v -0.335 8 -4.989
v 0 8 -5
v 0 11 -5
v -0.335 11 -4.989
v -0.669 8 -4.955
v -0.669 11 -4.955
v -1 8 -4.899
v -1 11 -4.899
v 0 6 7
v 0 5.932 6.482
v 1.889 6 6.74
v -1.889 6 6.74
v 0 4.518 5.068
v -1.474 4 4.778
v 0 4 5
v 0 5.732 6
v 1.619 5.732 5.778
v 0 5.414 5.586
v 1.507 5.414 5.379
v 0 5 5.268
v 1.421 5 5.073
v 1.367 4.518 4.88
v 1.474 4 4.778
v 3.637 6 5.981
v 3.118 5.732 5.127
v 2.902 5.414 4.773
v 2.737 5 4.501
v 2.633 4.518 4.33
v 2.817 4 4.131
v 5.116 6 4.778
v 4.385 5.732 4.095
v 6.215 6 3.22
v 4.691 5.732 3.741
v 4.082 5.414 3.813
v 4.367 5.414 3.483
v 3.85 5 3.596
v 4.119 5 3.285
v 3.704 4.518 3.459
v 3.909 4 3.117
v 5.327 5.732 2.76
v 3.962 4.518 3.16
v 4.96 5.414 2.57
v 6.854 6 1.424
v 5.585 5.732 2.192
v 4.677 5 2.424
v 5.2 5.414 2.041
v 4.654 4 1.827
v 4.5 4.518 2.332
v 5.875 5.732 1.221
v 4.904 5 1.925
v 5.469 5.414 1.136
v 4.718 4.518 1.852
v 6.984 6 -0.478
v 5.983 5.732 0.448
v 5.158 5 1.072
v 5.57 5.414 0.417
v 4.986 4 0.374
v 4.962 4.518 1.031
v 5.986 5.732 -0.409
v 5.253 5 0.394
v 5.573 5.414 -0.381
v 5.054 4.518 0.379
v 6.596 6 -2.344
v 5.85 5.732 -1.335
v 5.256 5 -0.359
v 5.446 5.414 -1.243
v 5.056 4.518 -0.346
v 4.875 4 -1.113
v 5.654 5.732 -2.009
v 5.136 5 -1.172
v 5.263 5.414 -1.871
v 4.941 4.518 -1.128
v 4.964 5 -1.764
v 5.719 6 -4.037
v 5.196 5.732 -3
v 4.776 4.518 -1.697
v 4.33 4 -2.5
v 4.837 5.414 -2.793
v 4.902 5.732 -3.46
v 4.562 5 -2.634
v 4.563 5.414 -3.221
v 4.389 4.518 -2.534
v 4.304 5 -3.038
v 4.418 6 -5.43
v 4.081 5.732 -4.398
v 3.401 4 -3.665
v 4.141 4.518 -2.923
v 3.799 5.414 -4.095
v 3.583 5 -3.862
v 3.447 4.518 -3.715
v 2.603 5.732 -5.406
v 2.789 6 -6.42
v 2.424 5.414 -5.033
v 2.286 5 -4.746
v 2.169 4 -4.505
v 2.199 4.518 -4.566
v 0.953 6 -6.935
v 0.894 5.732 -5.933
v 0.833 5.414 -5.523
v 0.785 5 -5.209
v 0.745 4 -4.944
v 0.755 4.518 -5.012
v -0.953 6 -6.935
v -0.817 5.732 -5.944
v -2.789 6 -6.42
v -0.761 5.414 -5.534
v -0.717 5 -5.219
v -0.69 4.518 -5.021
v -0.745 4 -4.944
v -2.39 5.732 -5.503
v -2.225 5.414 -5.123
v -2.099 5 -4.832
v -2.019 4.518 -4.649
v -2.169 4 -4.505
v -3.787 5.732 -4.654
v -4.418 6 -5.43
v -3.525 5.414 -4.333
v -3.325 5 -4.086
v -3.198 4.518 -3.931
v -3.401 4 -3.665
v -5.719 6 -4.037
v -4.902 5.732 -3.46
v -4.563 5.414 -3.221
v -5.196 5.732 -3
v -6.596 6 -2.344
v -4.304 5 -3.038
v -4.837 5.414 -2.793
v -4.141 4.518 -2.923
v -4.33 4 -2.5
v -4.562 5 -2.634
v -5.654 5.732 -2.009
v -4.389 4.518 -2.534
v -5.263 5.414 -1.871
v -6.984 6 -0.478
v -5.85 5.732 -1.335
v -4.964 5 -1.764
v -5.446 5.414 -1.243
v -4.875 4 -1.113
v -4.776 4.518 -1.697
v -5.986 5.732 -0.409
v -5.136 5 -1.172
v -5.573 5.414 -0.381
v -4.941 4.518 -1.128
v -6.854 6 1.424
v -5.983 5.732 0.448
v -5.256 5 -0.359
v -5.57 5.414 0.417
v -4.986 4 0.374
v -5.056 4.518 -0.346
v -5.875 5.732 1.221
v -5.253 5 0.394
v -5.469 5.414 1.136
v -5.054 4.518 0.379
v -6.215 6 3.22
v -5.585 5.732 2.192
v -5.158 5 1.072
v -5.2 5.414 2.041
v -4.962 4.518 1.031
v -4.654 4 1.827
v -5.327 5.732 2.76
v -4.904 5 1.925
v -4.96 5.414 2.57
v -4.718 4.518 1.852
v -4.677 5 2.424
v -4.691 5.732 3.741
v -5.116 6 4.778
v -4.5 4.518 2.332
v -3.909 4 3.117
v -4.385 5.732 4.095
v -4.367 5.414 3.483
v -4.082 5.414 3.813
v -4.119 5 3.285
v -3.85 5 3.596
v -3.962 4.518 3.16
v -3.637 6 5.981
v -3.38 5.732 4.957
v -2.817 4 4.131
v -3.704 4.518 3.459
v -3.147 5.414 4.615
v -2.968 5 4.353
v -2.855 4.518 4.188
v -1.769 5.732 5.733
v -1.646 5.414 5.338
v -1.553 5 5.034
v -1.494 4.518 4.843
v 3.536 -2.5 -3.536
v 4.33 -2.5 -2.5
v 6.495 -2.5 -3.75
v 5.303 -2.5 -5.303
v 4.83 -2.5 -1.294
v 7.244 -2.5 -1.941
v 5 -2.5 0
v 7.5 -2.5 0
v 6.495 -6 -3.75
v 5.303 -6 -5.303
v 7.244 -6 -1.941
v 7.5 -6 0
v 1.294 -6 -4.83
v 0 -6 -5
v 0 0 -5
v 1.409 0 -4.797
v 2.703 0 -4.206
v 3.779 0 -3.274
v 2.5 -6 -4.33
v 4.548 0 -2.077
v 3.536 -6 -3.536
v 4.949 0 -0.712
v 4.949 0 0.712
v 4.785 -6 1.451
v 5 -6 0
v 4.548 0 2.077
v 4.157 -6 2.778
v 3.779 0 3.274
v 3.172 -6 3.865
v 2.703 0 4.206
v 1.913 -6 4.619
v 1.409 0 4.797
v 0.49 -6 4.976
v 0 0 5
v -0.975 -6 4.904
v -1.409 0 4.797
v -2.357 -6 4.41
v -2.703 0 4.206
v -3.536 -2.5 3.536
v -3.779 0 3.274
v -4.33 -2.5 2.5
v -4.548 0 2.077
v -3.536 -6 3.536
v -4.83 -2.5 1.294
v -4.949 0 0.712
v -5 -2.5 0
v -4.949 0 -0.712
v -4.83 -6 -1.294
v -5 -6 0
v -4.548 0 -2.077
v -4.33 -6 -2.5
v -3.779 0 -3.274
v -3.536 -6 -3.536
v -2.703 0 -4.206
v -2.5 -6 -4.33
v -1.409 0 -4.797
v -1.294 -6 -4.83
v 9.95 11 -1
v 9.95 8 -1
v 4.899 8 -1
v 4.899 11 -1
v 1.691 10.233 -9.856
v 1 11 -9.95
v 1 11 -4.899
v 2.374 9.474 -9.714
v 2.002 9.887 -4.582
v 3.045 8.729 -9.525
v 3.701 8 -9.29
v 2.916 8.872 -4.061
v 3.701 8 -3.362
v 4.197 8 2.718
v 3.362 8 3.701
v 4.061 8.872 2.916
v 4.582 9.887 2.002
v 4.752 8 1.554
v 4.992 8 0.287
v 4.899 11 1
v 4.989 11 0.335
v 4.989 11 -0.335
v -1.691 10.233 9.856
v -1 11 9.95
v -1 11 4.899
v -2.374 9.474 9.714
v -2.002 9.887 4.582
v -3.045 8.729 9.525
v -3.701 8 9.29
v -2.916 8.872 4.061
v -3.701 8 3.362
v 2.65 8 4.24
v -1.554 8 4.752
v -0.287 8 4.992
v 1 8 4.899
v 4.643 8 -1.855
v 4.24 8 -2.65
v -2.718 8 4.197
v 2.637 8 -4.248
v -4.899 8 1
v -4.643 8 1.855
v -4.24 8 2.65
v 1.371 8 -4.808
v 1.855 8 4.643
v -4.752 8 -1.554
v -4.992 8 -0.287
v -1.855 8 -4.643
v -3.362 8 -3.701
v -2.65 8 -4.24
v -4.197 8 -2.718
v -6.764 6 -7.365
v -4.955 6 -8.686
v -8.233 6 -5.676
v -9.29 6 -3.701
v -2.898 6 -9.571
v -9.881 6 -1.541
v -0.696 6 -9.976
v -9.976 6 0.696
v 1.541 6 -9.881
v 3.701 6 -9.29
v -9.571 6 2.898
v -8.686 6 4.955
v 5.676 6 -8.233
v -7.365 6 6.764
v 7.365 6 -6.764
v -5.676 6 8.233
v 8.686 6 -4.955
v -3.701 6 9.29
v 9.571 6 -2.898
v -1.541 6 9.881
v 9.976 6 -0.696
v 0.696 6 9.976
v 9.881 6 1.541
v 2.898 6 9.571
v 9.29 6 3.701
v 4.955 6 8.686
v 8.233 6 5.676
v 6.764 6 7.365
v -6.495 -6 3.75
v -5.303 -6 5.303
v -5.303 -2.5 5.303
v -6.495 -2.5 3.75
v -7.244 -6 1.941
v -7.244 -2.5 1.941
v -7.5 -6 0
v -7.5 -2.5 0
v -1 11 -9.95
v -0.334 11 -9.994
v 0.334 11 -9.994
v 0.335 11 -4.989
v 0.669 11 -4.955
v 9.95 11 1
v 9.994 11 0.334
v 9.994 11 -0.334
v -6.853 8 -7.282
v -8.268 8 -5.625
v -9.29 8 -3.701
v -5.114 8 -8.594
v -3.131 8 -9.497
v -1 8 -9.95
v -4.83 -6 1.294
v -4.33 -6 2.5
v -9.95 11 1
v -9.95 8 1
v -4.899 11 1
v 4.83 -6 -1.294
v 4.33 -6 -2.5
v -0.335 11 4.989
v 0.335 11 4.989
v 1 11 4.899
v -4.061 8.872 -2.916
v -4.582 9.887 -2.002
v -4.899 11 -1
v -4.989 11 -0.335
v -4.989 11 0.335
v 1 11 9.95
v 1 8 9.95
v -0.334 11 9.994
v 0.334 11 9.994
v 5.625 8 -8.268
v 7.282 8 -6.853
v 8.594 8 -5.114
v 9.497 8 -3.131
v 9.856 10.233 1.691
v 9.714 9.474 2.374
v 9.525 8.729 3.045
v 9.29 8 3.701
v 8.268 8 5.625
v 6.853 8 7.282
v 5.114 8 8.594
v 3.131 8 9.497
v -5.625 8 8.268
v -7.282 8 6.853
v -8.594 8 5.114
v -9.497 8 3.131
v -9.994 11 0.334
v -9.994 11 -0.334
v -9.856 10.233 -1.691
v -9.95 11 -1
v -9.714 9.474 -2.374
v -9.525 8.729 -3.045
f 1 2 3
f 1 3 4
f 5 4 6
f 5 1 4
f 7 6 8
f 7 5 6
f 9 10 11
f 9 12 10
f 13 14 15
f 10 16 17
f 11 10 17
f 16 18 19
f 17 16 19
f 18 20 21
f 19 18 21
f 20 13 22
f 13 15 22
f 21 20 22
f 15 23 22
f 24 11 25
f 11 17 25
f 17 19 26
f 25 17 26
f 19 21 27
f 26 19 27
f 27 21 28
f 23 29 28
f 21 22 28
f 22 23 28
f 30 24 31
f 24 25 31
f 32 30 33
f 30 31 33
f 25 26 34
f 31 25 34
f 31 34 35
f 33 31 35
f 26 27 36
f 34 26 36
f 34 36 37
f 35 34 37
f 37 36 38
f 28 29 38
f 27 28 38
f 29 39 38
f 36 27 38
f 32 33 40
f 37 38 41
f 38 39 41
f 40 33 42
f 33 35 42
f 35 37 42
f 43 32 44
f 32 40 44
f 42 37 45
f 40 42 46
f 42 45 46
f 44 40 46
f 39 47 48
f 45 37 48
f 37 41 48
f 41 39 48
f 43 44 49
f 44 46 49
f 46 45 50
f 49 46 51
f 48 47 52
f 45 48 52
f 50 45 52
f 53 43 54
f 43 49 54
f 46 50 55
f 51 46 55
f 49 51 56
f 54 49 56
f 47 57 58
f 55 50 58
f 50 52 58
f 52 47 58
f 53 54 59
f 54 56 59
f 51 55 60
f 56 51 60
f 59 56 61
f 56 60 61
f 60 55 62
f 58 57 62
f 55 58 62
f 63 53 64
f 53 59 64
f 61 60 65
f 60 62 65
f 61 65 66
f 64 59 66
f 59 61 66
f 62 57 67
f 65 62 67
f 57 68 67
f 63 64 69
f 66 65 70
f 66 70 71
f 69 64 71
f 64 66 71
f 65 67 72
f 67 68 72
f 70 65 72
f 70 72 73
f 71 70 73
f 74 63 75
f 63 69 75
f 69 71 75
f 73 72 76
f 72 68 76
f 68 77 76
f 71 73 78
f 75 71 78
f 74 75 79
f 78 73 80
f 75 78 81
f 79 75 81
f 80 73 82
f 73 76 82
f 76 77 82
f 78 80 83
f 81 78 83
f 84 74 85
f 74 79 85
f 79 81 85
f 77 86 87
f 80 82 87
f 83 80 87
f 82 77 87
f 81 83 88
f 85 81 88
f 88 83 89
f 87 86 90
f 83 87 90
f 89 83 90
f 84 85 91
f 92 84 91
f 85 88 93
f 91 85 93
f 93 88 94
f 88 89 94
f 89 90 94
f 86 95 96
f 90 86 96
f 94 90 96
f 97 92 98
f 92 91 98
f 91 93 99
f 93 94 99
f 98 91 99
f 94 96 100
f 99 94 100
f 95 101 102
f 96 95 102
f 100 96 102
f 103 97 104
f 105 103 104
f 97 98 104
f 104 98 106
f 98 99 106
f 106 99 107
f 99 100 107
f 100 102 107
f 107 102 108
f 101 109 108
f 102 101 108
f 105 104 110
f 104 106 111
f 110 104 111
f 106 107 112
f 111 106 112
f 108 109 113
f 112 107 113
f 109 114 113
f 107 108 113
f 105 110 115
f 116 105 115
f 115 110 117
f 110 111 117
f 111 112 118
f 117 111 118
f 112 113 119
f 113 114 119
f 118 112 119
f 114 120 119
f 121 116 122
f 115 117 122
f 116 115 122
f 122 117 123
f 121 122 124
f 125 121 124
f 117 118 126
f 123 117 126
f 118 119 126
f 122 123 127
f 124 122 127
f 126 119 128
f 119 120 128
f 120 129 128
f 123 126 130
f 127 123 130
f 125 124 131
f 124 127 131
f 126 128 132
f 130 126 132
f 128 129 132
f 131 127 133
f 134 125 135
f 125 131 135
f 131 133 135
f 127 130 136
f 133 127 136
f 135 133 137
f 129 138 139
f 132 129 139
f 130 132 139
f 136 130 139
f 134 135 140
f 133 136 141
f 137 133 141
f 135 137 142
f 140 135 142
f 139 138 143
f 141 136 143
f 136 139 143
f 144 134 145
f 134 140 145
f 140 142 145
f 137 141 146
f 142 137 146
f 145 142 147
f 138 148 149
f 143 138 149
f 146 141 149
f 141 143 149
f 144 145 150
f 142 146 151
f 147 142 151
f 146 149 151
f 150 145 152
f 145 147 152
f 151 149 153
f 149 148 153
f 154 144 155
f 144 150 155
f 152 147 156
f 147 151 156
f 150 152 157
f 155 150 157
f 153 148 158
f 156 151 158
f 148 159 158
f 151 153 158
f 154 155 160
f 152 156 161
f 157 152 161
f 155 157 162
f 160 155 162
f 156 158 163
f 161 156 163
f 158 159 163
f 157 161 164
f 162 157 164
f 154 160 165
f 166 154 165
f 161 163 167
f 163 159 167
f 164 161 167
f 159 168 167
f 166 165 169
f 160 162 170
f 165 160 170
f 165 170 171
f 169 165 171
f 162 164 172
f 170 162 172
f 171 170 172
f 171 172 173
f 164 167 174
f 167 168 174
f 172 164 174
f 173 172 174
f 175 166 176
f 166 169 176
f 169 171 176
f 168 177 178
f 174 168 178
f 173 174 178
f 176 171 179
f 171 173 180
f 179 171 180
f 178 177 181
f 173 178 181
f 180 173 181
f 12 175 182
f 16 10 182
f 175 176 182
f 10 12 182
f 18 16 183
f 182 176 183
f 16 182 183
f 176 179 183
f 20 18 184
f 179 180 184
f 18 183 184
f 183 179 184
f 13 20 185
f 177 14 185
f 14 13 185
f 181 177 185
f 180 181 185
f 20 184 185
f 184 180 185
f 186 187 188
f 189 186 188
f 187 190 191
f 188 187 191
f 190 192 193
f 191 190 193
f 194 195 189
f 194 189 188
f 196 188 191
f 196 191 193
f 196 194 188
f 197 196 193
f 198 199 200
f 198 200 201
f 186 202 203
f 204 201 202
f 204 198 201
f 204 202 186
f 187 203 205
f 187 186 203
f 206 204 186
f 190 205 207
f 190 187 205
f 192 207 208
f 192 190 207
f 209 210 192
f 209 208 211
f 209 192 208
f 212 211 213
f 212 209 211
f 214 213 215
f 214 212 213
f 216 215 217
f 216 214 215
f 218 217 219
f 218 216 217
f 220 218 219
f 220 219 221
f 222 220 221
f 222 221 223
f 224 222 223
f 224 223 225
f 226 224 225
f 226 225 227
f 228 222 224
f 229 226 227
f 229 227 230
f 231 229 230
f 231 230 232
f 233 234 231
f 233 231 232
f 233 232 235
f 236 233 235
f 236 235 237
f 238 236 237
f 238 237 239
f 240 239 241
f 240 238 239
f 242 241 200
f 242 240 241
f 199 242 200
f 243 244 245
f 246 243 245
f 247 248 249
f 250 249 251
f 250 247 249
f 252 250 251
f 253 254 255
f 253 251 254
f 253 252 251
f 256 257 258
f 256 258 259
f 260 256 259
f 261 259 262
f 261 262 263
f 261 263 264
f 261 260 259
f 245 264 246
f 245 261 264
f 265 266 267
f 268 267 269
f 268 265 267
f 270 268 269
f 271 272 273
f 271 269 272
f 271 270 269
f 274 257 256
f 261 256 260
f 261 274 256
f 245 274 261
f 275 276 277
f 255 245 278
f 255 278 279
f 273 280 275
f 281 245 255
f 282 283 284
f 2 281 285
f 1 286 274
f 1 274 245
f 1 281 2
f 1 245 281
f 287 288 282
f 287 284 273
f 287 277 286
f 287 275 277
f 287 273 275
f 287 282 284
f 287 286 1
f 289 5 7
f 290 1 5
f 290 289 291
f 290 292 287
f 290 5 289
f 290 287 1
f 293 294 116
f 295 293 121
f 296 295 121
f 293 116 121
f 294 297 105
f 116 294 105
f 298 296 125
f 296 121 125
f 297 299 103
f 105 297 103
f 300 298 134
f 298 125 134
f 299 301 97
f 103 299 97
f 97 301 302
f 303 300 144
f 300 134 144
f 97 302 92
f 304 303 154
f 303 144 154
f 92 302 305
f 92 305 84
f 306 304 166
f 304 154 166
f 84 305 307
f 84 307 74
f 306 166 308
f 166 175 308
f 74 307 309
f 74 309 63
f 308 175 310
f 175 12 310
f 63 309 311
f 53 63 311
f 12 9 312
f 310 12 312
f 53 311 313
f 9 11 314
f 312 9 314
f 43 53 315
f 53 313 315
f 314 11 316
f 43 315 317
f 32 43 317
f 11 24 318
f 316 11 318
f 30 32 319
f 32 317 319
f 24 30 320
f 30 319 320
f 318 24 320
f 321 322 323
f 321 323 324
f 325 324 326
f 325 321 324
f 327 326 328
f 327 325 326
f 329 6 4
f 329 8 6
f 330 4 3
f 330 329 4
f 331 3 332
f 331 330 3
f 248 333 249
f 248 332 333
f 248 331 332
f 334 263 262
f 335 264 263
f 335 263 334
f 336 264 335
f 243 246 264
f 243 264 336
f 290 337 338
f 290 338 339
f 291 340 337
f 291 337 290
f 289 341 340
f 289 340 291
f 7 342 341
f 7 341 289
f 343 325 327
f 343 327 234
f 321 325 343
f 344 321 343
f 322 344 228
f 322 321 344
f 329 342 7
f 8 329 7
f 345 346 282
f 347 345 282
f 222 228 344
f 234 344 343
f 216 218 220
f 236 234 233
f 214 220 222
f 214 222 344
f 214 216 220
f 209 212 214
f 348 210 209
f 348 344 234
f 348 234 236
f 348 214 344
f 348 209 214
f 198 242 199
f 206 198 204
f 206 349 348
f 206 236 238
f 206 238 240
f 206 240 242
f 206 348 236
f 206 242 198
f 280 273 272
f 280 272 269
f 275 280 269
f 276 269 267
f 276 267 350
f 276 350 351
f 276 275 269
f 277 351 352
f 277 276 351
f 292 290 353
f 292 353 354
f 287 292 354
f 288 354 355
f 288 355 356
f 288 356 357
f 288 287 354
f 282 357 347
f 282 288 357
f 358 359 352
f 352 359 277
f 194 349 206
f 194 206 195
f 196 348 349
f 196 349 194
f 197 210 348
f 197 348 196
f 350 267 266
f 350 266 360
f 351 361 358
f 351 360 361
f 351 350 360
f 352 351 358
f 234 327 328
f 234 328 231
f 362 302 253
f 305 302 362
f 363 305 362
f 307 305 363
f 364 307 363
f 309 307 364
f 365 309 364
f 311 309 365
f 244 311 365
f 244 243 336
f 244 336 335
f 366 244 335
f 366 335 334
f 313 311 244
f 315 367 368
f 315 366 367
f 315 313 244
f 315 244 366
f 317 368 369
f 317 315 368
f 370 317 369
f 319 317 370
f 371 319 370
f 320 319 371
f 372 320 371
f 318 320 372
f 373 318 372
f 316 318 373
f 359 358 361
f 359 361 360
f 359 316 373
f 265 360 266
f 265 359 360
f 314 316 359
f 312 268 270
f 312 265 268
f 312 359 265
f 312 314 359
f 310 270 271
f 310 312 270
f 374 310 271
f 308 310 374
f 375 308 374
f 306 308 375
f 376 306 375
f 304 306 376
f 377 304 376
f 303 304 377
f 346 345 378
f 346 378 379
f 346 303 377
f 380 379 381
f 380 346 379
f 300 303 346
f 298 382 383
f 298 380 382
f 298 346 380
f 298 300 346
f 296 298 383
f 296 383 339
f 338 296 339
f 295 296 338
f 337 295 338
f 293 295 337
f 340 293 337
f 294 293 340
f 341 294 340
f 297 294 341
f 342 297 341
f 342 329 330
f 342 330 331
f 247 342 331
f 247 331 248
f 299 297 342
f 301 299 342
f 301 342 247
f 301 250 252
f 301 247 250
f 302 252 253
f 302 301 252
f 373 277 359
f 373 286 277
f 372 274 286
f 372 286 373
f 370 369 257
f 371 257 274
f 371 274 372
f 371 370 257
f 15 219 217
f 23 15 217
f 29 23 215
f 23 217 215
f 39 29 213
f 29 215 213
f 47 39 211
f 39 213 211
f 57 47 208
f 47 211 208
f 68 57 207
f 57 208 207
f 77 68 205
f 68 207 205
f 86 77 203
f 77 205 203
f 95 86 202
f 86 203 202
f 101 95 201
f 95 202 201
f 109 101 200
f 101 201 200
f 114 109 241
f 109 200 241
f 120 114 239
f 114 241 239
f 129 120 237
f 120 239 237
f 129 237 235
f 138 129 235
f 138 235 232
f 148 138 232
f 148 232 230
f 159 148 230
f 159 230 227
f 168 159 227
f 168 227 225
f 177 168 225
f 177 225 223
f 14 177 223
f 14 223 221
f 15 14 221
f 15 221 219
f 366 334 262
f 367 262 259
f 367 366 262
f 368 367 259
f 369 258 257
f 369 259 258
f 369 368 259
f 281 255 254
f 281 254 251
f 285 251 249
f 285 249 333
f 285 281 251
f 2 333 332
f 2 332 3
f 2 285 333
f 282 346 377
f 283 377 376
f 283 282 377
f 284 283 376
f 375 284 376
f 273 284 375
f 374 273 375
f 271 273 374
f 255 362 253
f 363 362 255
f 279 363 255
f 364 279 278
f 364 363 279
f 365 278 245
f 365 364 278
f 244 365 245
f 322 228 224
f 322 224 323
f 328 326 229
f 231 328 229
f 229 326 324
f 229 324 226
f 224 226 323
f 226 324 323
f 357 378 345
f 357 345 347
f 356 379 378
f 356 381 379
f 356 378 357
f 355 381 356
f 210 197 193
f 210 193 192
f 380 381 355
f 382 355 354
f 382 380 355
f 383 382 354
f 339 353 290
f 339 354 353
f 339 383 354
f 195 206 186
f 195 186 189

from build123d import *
from build123d.topology import SkipClean

# Parameters (mm, degrees)
SKETCH1_R               = 5
BOSS_EXTRUDE1_DEPTH     = 6
BOSS_EXTRUDE5_START     = 6
SKETCH11_R              = 5
BOSS_EXTRUDE5_DEPTH     = 6
SKETCH2_R               = 10
BOSS_EXTRUDE2_DEPTH     = 2
BOSS_EXTRUDE3_DEPTH     = 3
BOSS_EXTRUDE4_REACH     = 26.92
CIRPATTERN1_COUNT       = 4
CUT_EXTRUDE3_DEPTH      = 20.8997487421324
CUT_EXTRUDE3_DEPTH_BACK = 20.8997487421324
SKETCH10_R              = 13.301263658979888
FILLET1_R               = 2
CUT_EXTRUDE4_START      = -3
SKETCH12_R              = 5
CUT_EXTRUDE4_DEPTH      = 3
BOSS_EXTRUDE6_DEPTH     = 3.5


with BuildPart() as part:
    # Sketch1 → Boss-Extrude1 (new body)
    with BuildSketch(Plane(origin=(0, 0, 0), x_dir=(1, 0, 0), z_dir=(0, 1, 0))):
        with Locations(Location((0, 0, 0), (0, 0, 270))):
            Circle(SKETCH1_R)
    extrude(amount=BOSS_EXTRUDE1_DEPTH)

    # Sketch11 → Boss-Extrude5 (add)
    with BuildSketch(Plane.XZ.offset(BOSS_EXTRUDE5_START)):
        with Locations(Location((0, 0, 0), (0, 0, 270))):
            Circle(SKETCH11_R)
    extrude(amount=-BOSS_EXTRUDE5_DEPTH)

    # Sketch2 → Boss-Extrude2 (add)
    with BuildSketch(Plane(origin=(0, 6, 0), x_dir=(1, 0, 0), z_dir=(0, 1, 0))):
        with Locations(Location((0, 0, 0), (0, 0, 270))):
            Circle(SKETCH2_R)
    extrude(amount=BOSS_EXTRUDE2_DEPTH)

    # Sketch4 → Boss-Extrude3 (add)
    with BuildSketch(Plane(origin=(0, 8, 0), x_dir=(1, 0, 0), z_dir=(0, 1, 0))):
        with BuildLine():
            Line((1, 9.999999999999998), (-1, 9.999999999999998))
            Line((-1, 9.999999999999998), (-1, 4.898979485566357))
            ThreePointArc((-1, 4.898979485566357), (-3.5355339059327378, 3.5355339059327386), (-4.898979485566357, 1))
            Line((-4.898979485566357, 1), (-10, 1.0000000000000004))
            Line((-10, 1.0000000000000004), (-10, -1))
            Line((-10, -1), (-4.898979485566357, -1))
            ThreePointArc((-4.898979485566357, -1), (-3.5355339059327378, -3.5355339059327386), (-1, -4.898979485566356))
            Line((-1, -4.898979485566356), (-1.0000000000000002, -10.000000000000002))
            Line((-1.0000000000000002, -10.000000000000002), (1.0000000000000002, -10))
            Line((1.0000000000000002, -10), (1, -4.898979485566356))
            ThreePointArc((1, -4.898979485566356), (3.5355339059327378, -3.5355339059327373), (4.898979485566357, -1))
            Line((4.898979485566357, -1), (10, -1))
            Line((10, -1), (10, 1))
            Line((10, 1), (4.898979485566357, 1))
            ThreePointArc((4.898979485566357, 1), (3.5355339059327378, 3.5355339059327386), (1, 4.898979485566357))
            Line((1, 4.898979485566357), (1, 9.999999999999998))
        make_face()
    extrude(amount=BOSS_EXTRUDE3_DEPTH)

    # Sketch9 → Boss-Extrude4 (add, up to next)
    with BuildSketch(Plane(origin=(0, 0, -9.999999999999998), x_dir=(-1, 0, 0), z_dir=(0, 0, -1)), mode=Mode.PRIVATE) as boss_extrude4_sk1:
        Polygon((-1, 11), (-3.7012121328935463, 8), (-1.000000000000001, 8), align=None)
    boss_extrude4_tool1 = extrude(boss_extrude4_sk1.sketch, amount=-BOSS_EXTRUDE4_REACH, mode=Mode.PRIVATE) - part.part
    boss_extrude4 = boss_extrude4_tool1.solids().sort_by_distance((1.900404, 9, -10))[0]
    add(boss_extrude4)

    # CirPattern1: Boss-Extrude4 ×4 about axis
    cirpattern1_axis = Axis((0, 0, 1.47e-15), (0, 1, 0))
    for i in range(1, CIRPATTERN1_COUNT):
        add(boss_extrude4.rotate(cirpattern1_axis, i * 360 / CIRPATTERN1_COUNT))

    # Sketch10 → Cut-Extrude3 (cut, two sides: drawn at the far end of the back side and taken through both)
    with BuildSketch(Plane(origin=(0, 8, 0), x_dir=(1, 0, 0), z_dir=(0, 1, 0)).offset(-CUT_EXTRUDE3_DEPTH_BACK)):
        Circle(SKETCH10_R)
        with BuildLine():
            ThreePointArc((9.9498743710662, 0.9999999999999999), (9.987460731103328, 0.5006277505981886), (10, 0))
            ThreePointArc((10, -2.45e-15), (-8.276838808655619, -5.611946127283498), (3.7012121328935477, 9.289834699676932))
            ThreePointArc((3.701212132893546, 9.28983469967693), (7.985510661293986, 6.019270676615241), (9.9498743710662, 1))
        make_face(mode=Mode.SUBTRACT)
    extrude(amount=CUT_EXTRUDE3_DEPTH + CUT_EXTRUDE3_DEPTH_BACK, mode=Mode.SUBTRACT)

    # Fillet1
    fillet1_edges = [part.edges().sort_by_distance(p)[0] for p in [
        (1.53e-15, 6, -5),
    ]]
    fillet(fillet1_edges, radius=FILLET1_R)

    # Sketch12 → Cut-Extrude4 (cut)
    with SkipClean():  # the faces are left unmerged after this step: merging them gives an invalid solid
        with BuildSketch(Plane(origin=(0, 11, 0), x_dir=(1, 0, 0), z_dir=(0, 1, 0)).offset(CUT_EXTRUDE4_START)):
            with Locations(Location((0, 0, 0), (0, 0, 90))):
                Circle(SKETCH12_R)
        extrude(amount=CUT_EXTRUDE4_DEPTH, mode=Mode.SUBTRACT)

    # Sketch14 → Boss-Extrude6 (add)
    with SkipClean():  # the faces are left unmerged after this step: merging them gives an invalid solid
        with BuildSketch(Plane.XZ.offset(6)):
            with BuildLine():
                ThreePointArc((-5, 6.1e-16), (-4.619397662556429, 1.9134171618254616), (-3.535533905932718, 3.535533905932757))
                Line((-3.535533905932719, 3.5355339059327564), (-5.303300858899078, 5.303300858899133))
                ThreePointArc((-5.303300858899077, 5.303300858899135), (-6.929096493834643, 2.8701257427381925), (-7.5, 9.2e-16))
                Line((-7.5, -2.4e-16), (-5, 0))
            make_face()
            with BuildLine():
                Line((7.5, -2.4e-16), (5, 0))
                ThreePointArc((5, -1.22e-15), (4.619397662556436, -1.9134171618254436), (3.535533905932746, -3.535533905932729))
                Line((3.535533905932746, -3.5355339059327293), (5.303300858899117, -5.303300858899095))
                ThreePointArc((5.3033008588991155, -5.303300858899099), (6.9290964938346535, -2.8701257427381655), (7.5, -1.84e-15))
            make_face()
        extrude(amount=-BOSS_EXTRUDE6_DEPTH)


solid = part.part
